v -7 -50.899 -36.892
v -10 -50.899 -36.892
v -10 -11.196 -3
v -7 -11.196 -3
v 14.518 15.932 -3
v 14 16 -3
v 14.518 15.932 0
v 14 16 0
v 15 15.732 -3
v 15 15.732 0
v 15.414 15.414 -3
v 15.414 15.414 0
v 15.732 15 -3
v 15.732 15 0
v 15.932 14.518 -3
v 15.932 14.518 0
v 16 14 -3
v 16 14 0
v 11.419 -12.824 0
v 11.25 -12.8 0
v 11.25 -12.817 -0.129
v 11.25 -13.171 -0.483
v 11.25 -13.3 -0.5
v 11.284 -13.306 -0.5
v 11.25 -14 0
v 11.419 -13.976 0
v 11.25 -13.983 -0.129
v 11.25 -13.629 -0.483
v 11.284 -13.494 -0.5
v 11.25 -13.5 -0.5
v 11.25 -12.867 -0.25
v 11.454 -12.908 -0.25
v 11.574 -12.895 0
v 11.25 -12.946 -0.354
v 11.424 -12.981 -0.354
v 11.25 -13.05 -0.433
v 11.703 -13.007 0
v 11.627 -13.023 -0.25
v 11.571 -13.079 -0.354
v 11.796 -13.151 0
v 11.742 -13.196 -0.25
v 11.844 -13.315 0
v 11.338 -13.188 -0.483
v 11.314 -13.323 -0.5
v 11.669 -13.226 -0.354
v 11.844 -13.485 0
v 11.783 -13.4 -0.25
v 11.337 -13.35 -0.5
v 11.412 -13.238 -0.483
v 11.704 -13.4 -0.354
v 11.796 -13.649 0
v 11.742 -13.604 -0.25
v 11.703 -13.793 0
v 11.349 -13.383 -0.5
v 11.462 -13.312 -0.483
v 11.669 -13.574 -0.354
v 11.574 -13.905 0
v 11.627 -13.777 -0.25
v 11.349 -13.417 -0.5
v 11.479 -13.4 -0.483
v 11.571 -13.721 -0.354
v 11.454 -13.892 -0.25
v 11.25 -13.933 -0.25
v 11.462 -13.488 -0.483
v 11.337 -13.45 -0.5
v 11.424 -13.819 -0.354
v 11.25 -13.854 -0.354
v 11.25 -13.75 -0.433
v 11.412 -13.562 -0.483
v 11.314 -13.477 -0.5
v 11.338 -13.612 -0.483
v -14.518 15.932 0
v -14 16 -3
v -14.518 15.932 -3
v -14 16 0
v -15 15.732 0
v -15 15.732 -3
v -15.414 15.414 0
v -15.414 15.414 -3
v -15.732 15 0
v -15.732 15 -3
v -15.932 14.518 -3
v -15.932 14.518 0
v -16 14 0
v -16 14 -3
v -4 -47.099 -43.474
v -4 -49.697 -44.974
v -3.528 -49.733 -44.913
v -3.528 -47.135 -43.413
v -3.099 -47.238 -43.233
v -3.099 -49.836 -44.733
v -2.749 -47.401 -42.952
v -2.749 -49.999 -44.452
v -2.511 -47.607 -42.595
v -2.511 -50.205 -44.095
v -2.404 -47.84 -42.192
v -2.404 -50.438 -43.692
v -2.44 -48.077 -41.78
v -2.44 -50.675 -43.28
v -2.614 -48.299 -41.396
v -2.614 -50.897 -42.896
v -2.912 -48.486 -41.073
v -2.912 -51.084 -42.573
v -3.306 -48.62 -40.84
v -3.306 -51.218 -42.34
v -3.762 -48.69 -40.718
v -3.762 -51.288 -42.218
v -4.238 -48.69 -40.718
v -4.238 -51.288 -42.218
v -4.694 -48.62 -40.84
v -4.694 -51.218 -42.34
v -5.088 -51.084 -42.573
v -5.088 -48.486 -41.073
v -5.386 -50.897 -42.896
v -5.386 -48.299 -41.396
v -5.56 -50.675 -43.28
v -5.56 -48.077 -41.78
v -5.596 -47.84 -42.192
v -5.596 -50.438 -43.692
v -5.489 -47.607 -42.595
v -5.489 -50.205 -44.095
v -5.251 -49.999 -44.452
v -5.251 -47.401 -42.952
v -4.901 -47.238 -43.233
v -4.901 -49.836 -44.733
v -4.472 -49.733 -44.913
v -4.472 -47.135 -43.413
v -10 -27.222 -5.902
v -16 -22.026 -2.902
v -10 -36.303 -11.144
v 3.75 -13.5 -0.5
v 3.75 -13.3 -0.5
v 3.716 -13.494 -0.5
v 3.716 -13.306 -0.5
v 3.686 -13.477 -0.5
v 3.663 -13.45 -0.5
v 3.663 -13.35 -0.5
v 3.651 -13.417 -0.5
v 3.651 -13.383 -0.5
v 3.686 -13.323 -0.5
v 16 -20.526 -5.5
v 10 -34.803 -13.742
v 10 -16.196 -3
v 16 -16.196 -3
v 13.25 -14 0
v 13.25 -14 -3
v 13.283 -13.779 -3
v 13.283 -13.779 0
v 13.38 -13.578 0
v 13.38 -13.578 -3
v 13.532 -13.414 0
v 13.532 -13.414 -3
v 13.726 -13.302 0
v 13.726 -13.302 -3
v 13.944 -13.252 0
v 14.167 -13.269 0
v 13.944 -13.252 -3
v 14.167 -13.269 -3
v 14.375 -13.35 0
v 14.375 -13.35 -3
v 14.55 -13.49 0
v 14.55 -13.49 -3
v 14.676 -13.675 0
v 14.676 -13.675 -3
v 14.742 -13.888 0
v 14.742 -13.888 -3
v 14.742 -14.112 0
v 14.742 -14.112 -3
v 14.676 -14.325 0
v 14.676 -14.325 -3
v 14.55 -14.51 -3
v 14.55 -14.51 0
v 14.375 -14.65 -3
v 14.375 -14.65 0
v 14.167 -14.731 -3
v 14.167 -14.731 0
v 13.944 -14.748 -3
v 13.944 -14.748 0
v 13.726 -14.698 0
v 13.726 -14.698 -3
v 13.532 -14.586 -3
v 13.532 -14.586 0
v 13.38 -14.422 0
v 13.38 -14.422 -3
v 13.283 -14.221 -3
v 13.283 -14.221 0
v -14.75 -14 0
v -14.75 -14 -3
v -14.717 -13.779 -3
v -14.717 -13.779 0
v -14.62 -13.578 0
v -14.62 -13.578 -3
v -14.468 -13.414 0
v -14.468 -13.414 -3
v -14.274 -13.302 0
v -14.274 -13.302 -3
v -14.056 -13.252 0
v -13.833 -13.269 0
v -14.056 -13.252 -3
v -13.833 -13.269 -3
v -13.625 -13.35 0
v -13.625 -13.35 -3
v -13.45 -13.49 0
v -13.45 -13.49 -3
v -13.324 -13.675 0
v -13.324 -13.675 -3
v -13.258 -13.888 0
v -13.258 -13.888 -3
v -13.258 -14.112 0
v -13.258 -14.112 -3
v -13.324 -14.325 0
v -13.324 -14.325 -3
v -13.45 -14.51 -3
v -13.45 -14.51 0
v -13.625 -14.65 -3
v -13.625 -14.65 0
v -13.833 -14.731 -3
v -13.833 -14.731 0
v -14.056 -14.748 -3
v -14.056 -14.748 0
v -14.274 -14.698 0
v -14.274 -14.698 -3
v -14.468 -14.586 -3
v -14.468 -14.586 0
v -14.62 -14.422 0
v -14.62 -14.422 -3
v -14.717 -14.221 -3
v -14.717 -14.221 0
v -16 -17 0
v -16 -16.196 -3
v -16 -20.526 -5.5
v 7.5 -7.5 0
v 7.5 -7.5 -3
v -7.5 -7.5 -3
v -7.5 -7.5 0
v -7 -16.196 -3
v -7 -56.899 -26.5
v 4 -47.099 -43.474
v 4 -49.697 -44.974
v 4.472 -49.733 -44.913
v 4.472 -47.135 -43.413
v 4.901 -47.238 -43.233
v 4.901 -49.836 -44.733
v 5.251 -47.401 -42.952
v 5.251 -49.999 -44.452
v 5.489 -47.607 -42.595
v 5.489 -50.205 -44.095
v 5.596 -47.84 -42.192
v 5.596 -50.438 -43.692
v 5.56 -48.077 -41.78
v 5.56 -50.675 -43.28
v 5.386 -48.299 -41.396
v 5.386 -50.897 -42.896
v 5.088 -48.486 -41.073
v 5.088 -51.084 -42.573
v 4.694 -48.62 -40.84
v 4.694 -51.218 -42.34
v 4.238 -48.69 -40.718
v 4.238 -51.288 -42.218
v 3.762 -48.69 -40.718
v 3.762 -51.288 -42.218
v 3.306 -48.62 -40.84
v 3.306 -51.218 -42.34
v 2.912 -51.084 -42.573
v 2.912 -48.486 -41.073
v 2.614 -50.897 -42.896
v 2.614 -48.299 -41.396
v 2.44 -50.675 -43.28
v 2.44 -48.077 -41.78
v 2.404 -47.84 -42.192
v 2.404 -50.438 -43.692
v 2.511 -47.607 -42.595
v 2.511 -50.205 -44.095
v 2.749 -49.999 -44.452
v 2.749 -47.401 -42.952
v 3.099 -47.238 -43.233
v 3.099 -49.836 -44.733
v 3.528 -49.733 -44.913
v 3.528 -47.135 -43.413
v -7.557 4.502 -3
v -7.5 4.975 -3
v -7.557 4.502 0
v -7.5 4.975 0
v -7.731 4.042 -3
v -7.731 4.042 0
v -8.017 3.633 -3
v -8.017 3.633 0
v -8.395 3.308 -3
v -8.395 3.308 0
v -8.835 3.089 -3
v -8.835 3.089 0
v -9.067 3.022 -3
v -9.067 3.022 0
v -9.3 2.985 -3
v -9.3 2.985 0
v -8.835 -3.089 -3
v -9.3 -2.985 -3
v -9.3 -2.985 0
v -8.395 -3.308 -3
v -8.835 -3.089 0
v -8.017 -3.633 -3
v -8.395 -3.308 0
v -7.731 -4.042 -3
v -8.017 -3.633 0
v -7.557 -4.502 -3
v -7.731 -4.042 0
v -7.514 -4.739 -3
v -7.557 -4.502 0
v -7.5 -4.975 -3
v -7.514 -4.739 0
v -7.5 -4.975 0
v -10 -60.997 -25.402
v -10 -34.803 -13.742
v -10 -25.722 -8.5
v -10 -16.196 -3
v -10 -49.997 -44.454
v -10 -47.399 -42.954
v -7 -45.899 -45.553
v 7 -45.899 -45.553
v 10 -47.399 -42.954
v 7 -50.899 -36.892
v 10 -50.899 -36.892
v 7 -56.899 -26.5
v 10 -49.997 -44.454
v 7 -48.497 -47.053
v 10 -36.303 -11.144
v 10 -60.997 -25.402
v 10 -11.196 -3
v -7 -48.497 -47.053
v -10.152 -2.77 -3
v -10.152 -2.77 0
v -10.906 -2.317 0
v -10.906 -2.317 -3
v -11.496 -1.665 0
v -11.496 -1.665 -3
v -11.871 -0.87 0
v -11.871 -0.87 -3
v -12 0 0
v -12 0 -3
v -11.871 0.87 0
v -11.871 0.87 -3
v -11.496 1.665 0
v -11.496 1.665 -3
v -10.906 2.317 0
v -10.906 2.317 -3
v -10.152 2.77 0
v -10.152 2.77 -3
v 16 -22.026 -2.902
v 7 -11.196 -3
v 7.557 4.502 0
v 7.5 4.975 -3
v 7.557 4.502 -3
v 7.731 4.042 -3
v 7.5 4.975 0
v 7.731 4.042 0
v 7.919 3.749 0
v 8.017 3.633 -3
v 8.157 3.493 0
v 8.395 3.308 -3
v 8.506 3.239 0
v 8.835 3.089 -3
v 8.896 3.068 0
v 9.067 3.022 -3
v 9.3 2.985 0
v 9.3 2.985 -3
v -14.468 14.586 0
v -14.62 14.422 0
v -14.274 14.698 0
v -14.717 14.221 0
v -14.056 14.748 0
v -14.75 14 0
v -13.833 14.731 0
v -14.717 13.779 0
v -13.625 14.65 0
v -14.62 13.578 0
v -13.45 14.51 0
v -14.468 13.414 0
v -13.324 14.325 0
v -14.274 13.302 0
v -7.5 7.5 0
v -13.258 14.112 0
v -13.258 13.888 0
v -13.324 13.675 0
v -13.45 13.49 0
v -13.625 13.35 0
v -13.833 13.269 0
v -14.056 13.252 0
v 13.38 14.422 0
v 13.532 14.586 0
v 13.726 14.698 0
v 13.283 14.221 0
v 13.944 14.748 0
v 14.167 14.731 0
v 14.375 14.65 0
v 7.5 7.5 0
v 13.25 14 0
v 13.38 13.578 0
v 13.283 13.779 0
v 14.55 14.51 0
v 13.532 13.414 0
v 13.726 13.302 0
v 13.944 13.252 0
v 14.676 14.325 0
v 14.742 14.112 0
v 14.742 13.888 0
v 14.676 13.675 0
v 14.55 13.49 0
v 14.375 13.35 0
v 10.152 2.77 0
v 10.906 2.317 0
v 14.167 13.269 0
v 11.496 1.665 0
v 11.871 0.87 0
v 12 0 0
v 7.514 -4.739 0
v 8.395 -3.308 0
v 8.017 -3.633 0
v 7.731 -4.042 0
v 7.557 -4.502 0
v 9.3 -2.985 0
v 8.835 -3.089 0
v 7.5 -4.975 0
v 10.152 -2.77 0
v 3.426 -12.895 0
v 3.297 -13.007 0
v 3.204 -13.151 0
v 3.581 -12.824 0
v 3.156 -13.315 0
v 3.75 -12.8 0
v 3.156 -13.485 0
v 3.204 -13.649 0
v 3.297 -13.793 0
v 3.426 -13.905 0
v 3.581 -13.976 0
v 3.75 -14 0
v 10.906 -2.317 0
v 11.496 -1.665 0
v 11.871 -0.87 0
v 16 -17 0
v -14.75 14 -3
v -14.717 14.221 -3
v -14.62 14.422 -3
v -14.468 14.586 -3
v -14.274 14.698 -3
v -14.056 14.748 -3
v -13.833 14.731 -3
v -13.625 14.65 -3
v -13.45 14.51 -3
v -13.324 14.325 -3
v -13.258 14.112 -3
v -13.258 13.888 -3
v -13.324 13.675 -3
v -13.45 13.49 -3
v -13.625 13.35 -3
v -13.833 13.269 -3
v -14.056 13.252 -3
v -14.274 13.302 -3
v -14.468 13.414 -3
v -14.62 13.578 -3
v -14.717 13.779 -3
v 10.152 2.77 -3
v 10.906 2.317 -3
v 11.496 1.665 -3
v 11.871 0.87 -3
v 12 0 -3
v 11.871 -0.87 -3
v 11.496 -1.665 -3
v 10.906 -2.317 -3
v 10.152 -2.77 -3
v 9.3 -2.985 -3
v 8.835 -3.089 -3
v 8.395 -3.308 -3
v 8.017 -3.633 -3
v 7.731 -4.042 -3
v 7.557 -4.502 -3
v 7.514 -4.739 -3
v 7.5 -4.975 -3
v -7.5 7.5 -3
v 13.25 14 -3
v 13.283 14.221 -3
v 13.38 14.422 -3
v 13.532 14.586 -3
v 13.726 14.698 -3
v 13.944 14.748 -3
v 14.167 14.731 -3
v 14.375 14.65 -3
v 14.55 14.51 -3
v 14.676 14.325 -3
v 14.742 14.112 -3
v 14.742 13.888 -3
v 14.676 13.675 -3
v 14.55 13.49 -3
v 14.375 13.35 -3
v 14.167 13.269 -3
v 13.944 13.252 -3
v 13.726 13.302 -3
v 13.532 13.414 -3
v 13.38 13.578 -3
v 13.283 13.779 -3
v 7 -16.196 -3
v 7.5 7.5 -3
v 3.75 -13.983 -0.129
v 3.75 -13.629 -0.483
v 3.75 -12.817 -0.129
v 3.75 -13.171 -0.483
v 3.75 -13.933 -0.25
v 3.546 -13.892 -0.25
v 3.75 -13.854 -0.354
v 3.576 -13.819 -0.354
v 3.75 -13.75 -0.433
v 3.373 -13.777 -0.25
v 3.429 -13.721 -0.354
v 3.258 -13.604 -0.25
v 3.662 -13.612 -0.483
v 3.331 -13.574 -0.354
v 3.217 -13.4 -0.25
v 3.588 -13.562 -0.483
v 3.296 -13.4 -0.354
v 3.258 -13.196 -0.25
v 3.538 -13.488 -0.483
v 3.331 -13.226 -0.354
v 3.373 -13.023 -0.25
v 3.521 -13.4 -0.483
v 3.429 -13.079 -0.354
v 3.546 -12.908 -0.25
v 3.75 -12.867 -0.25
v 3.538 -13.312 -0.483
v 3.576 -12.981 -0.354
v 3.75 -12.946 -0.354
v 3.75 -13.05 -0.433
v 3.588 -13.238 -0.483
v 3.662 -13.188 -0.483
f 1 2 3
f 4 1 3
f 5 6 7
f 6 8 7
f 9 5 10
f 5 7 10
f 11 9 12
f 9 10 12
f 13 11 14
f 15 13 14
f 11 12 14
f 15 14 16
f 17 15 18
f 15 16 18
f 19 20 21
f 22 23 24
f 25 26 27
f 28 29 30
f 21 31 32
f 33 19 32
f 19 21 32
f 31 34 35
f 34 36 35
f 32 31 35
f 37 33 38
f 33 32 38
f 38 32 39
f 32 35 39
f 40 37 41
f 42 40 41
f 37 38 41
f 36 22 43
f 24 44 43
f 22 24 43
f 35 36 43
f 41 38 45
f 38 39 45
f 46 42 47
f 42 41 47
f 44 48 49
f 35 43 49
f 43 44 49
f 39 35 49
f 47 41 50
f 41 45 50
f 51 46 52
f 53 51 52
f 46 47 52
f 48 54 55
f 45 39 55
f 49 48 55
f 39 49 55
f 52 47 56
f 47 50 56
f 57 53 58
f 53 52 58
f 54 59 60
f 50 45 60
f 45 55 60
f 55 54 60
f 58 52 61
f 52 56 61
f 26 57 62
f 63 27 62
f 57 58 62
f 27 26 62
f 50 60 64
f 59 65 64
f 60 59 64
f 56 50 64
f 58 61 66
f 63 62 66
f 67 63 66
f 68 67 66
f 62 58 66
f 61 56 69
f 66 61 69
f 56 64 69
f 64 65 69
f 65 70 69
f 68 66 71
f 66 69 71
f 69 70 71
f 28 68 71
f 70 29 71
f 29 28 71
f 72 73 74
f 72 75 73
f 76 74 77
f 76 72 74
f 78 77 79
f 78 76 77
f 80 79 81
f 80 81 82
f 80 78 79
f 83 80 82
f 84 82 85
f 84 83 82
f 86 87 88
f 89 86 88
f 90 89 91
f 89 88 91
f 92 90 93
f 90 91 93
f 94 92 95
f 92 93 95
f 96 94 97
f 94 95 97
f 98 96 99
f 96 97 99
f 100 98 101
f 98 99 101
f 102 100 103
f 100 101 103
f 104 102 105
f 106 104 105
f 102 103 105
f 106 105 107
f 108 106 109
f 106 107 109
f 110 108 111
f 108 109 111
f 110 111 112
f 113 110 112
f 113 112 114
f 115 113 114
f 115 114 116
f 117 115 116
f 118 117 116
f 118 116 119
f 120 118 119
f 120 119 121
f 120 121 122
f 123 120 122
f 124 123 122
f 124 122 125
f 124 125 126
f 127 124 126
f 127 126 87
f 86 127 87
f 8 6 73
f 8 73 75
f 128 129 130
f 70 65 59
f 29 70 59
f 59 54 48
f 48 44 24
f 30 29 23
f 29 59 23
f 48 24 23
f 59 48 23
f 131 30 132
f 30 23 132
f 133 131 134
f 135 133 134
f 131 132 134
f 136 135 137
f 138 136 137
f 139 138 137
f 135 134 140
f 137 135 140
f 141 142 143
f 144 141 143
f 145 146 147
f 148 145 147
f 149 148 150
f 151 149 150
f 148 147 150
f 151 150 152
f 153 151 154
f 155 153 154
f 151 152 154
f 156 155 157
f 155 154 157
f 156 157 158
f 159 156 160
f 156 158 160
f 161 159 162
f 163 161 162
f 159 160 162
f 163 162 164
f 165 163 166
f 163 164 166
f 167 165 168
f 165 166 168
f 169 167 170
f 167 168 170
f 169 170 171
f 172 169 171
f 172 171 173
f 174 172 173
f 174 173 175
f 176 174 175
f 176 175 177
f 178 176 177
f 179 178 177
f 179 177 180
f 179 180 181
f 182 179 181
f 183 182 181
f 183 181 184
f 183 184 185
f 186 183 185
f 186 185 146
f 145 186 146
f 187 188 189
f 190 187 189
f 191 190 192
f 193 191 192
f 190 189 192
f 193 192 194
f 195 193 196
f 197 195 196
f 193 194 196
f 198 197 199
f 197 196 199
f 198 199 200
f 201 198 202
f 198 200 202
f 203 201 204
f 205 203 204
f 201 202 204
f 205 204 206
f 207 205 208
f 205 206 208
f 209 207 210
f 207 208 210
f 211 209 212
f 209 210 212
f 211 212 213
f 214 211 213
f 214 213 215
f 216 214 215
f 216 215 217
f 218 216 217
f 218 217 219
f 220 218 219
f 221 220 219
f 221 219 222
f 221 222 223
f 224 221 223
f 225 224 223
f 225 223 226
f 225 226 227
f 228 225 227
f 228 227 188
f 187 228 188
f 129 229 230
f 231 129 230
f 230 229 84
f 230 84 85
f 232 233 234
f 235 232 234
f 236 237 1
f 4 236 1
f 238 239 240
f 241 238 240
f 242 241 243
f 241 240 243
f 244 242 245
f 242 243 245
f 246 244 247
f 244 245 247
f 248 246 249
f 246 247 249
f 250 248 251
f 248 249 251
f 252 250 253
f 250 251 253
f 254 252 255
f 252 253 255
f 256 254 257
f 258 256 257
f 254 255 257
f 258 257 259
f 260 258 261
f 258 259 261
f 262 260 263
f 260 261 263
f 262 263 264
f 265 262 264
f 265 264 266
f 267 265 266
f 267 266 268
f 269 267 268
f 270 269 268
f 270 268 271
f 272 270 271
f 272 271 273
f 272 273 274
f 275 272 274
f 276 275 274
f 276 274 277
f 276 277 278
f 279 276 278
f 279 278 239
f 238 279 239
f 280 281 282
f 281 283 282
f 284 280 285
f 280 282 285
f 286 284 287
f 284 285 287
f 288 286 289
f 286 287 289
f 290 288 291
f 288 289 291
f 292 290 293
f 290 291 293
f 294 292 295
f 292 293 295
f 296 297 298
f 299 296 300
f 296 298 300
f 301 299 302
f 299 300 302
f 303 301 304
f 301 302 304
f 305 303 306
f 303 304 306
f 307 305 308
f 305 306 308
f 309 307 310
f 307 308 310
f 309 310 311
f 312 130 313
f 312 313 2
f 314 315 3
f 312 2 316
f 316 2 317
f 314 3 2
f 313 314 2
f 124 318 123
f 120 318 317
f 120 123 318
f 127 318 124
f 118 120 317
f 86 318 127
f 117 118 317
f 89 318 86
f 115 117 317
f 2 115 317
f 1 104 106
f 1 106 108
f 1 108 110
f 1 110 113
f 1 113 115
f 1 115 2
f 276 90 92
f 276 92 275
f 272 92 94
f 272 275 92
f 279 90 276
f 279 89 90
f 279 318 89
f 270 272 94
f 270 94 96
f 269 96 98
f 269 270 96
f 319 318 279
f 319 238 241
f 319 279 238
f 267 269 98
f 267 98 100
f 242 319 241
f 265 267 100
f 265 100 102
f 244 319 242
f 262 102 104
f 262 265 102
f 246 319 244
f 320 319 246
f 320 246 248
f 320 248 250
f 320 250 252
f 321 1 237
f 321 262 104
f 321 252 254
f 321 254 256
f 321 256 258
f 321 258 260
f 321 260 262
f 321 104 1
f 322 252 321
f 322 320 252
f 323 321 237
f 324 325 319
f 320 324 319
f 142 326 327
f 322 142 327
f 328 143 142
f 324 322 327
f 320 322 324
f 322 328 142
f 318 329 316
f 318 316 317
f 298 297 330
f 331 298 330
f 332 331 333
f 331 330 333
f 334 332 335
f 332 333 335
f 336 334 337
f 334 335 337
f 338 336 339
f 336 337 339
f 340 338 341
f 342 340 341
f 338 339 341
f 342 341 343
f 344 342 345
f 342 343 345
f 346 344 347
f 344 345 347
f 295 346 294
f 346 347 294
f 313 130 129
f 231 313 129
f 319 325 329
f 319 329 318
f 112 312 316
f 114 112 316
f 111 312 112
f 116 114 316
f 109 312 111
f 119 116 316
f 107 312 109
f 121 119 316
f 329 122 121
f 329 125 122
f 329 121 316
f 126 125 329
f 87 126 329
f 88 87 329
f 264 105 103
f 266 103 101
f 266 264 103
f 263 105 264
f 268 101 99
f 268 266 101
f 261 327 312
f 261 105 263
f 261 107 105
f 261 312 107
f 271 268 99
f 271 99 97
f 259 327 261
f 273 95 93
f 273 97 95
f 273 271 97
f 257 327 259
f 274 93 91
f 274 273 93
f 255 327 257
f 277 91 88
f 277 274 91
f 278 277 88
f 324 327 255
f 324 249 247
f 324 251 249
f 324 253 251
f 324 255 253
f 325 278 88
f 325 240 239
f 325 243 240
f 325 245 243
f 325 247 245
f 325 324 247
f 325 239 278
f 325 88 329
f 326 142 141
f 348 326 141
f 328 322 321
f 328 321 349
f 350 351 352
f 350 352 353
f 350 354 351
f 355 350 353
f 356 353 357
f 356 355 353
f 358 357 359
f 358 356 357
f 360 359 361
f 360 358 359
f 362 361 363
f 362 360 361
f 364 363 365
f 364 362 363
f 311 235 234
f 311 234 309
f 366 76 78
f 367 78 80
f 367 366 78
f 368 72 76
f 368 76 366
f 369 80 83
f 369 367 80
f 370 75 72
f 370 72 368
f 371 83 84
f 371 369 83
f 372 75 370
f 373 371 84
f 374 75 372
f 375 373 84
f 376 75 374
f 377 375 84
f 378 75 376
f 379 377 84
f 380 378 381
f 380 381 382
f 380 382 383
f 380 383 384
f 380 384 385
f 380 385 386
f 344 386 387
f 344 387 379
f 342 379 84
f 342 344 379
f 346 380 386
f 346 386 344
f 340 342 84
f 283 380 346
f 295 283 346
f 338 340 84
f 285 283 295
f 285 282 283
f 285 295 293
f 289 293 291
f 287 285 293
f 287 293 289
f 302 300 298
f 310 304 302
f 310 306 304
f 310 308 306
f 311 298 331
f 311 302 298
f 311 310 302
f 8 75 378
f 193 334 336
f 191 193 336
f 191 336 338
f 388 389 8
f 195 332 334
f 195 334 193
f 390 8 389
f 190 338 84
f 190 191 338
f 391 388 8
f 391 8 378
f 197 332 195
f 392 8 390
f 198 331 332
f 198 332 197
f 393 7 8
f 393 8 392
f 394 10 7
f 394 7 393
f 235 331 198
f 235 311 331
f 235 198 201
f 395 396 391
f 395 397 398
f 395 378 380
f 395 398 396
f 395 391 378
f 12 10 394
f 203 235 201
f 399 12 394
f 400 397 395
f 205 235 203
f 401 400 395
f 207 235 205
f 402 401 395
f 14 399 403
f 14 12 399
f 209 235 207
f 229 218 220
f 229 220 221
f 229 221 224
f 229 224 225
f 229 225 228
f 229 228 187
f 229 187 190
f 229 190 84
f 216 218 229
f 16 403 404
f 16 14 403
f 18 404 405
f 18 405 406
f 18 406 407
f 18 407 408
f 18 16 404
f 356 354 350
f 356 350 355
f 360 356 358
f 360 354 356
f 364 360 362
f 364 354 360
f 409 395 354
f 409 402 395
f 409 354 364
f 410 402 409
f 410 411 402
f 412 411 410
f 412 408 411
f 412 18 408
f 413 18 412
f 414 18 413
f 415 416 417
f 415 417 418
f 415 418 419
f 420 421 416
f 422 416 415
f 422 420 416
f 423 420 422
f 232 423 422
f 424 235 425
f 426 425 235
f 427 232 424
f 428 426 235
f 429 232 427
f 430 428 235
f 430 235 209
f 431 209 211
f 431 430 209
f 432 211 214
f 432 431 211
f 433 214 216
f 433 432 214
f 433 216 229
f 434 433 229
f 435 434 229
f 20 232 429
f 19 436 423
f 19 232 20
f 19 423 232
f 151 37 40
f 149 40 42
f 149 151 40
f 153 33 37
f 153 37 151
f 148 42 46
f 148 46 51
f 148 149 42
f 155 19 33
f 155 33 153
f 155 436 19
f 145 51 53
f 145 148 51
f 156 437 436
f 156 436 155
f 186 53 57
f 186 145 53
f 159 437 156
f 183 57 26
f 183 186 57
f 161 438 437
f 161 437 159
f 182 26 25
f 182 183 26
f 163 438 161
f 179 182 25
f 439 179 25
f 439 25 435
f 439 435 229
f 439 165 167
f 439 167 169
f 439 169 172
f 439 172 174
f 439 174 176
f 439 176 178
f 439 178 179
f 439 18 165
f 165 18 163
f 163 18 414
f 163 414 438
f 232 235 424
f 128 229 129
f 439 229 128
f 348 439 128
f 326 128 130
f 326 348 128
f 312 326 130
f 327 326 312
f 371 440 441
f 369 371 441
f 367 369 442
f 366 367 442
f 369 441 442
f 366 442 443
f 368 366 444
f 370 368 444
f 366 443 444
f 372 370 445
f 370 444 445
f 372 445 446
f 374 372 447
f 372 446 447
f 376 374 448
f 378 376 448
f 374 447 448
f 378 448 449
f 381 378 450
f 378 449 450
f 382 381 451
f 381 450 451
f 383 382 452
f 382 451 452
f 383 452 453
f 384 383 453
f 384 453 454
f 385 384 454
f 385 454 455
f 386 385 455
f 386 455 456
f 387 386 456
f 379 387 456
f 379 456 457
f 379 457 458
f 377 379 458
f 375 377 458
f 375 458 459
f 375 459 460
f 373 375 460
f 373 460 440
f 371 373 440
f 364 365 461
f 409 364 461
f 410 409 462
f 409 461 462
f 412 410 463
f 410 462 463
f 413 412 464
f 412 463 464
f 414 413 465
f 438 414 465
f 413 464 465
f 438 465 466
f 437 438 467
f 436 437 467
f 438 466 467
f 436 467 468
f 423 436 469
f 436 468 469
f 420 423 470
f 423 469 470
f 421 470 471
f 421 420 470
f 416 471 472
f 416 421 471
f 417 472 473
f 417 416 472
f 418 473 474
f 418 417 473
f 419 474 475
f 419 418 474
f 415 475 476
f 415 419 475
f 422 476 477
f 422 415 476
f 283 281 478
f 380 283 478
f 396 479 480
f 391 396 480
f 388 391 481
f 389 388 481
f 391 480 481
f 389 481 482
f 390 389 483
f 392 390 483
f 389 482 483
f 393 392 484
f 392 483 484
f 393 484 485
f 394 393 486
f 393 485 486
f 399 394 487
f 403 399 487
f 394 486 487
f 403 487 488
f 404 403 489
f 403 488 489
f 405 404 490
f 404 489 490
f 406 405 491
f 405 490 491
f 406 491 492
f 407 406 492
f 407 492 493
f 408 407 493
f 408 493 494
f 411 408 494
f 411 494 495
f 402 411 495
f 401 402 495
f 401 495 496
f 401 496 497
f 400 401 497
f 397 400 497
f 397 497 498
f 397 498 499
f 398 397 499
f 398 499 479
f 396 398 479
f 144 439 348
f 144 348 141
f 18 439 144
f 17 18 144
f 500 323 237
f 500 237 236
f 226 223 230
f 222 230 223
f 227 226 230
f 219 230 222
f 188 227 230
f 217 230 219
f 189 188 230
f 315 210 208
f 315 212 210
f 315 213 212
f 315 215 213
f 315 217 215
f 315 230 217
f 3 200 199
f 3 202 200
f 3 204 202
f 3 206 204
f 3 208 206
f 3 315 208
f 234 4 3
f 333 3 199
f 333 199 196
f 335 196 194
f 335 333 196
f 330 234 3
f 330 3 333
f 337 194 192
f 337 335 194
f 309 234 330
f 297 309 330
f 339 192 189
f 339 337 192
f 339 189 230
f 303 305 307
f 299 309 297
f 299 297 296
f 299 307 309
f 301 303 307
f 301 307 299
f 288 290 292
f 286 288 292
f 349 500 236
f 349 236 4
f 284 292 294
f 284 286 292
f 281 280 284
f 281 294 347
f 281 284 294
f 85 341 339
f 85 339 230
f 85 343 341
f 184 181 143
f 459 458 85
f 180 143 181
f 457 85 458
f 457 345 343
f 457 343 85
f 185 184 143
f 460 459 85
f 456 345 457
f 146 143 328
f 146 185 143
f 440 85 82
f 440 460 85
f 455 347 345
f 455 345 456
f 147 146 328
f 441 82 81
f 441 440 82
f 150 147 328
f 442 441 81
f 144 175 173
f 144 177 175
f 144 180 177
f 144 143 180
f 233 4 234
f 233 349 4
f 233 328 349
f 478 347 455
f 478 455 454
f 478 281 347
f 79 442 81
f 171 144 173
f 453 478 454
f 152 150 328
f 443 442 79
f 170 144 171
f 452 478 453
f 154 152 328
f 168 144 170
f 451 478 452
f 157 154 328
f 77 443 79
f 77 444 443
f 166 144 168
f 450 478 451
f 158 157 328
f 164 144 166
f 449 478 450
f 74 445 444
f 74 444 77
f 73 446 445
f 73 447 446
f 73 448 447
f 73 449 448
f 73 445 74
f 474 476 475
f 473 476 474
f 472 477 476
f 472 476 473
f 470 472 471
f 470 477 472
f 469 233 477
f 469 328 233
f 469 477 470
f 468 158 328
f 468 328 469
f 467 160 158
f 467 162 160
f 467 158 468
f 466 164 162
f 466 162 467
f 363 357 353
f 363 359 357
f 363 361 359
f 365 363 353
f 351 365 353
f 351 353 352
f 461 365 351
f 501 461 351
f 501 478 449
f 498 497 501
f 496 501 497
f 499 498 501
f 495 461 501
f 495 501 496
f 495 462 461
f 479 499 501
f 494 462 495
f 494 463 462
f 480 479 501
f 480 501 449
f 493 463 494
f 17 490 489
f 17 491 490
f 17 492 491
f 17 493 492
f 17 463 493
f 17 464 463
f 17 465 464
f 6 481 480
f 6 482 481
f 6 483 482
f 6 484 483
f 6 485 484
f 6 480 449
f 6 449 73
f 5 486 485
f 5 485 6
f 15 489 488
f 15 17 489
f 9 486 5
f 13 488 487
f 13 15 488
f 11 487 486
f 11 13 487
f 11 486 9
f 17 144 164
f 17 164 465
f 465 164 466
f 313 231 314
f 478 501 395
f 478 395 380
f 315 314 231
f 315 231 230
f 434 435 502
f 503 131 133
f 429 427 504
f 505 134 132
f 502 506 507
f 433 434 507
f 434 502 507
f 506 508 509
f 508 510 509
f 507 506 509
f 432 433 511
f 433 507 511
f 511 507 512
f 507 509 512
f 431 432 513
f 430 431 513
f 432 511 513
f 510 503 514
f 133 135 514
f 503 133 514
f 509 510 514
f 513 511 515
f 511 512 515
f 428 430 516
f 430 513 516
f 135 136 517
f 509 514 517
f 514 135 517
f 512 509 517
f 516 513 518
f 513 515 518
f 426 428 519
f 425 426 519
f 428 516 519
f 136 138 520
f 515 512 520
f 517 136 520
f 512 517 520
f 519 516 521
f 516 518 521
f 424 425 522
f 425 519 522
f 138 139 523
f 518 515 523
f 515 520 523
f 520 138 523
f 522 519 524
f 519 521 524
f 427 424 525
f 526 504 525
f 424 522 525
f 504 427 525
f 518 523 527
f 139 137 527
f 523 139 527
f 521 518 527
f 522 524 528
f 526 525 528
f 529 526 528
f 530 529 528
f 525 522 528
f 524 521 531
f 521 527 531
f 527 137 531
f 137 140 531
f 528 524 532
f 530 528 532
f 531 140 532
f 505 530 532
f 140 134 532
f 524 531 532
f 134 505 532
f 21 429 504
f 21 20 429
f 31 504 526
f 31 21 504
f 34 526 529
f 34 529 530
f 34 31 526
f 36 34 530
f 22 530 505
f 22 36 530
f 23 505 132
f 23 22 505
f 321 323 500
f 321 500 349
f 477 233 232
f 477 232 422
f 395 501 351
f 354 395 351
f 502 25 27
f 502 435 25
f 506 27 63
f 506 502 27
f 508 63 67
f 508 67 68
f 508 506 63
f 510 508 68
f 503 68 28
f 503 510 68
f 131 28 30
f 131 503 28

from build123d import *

# Parameters (mm, degrees)
BOSS_EXTRUDE1_DEPTH = 16
FILLET1_R           = 2
SKETCH2_W           = 15
SKETCH2_H           = 4.5
SKETCH2_H_2         = 6
SKETCH2_R           = 0.75
CUT_EXTRUDE1_DEPTH  = 32
SKETCH4_R           = 1.6
CUT_EXTRUDE2_DEPTH  = 92
CUT_EXTRUDE4_DEPTH  = 80.584099309
BOSS_EXTRUDE2_DEPTH = 3
DRAFT1_ANGLE        = 70
DRAFT2_START        = -8.5
DRAFT2_DEPTH        = 3
CUT_EXTRUDE5_DEPTH  = 0.5
FILLET4_R           = 0.5
FILLET3_R           = 2
CHAMFER1_SIZE       = 3


# Read off the part's stored shape, not the designer's step: Draft2
with BuildPart() as part:
    # Sketch1 → Boss-Extrude1 (new, symmetric)
    with BuildSketch(Plane(origin=(0, 0, 0), x_dir=(0, 0, -1), z_dir=(1, 0, 0))):
        Polygon((0, 16), (0, -17), (25.401923789, -60.997422612), (47.052558883, -48.497422612), (45.552558883, -45.899346401), (26.5, -56.899346401), (3, -16.196152423), (3, 16), align=None)
    extrude(amount=BOSS_EXTRUDE1_DEPTH, both=True)

    # Fillet1
    fillet1_edges = [part.edges().sort_by_distance(p)[0] for p in [
        (-16, 16, -1.5),
        (16, 16, -1.5),
    ]]
    fillet(fillet1_edges, radius=FILLET1_R)

    # Sketch2 → Cut-Extrude1 (cut)
    with BuildSketch(Plane(origin=(0, 0, -3), x_dir=(-1, 0, 0), z_dir=(0, 0, -1))):
        with Locations((0, 5.25)):
            Rectangle(SKETCH2_W, SKETCH2_H)
        Rectangle(SKETCH2_W, SKETCH2_H_2)
        with BuildLine():
            Line((-9, -3), (-7.5, -3))
            Line((-7.5, -3), (-7.5, 3))
            Line((-7.5, 3), (-9, 3))
            ThreePointArc((-9, 3), (-12, 0), (-9, -3))
        make_face()
        with Locations((0, -5.25)):
            Rectangle(SKETCH2_W, SKETCH2_H)
        with BuildLine():
            Line((7.5, 3), (7.5, -3))
            Line((7.5, -3), (9, -3))
            ThreePointArc((9, -3), (12, 0), (9, 3))
            Line((9, 3), (7.5, 3))
        make_face()
        with Locations((14, -14)):
            Circle(SKETCH2_R)
        with Locations((-14, -14)):
            Circle(SKETCH2_R)
        with Locations((-14, 14)):
            Circle(SKETCH2_R)
        with Locations((14, 14)):
            Circle(SKETCH2_R)
    extrude(amount=-CUT_EXTRUDE1_DEPTH, mode=Mode.SUBTRACT)

    # Sketch4 → Cut-Extrude2 (cut)
    with BuildSketch(Plane(origin=(0, -56.747422612, -32.763139721), x_dir=(1, 0, 0), z_dir=(0, -0.8660254037844379, -0.5000000000000014))):
        with Locations(Location((-4, -12.5, 0), (0, 0, 270))):
            Circle(SKETCH4_R)
        with Locations(Location((4, -12.5, 0), (0, 0, 270))):
            Circle(SKETCH4_R)
    extrude(amount=-CUT_EXTRUDE2_DEPTH, mode=Mode.SUBTRACT)

    # Sketch7 → Cut-Extrude4 (cut, symmetric)
    with BuildSketch(Plane(origin=(0, -2.75, 4.763139721), x_dir=(-1, 0, 0), z_dir=(0, 0.500000000000002, -0.8660254037844375))):
        Polygon((-10, -65.526279442), (-10, -26.526279442), (-16, -20.526279442), (-16, -65.526279442), align=None)
    cut_extrude4 = extrude(amount=CUT_EXTRUDE4_DEPTH, both=True, mode=Mode.SUBTRACT)

    # Sketch5 → Boss-Extrude2 (add)
    with BuildSketch(Plane(origin=(10, 0, 0), x_dir=(0, 0, -1), z_dir=(1, 0, 0))):
        Polygon((36.892304845, -50.899346401), (3, -11.196152423), (3, -16.196152423), (26.5, -56.899346401), align=None)
    boss_extrude2 = extrude(amount=-BOSS_EXTRUDE2_DEPTH)

    # Draft1
    draft1_faces = [part.faces().sort_by_distance(p)[0] for p in [
        (13, -23.874355653, -5.700961894),
    ]]
    draft(draft1_faces, Plane(origin=(16, 0, 0), x_dir=(0, 0, 1), z_dir=(1, 0, 0)), DRAFT1_ANGLE)

    # Mirror2: Cut-Extrude4, Boss-Extrude2 across plane
    add(cut_extrude4.mirror(Plane(origin=(0, 0, 0), x_dir=(0, 0, 1), z_dir=(1, 0, 0))), mode=Mode.SUBTRACT)
    add(boss_extrude2.mirror(Plane(origin=(0, 0, 0), x_dir=(0, 0, 1), z_dir=(1, 0, 0))))

    # Draft2 outline → Draft2 (add)
    with BuildSketch(Plane(origin=(0, 0, 0), x_dir=(1, 0, 0), z_dir=(0, 0.5000000000000018, -0.8660254037844377)).offset(DRAFT2_START)):
        Polygon((-10, 26.526279442), (-10, 37.011143958), (-16, 20.526279442), align=None)
    extrude(amount=DRAFT2_DEPTH)

    # Sketch8 → Cut-Extrude5 (cut)
    with BuildSketch(Plane.XY):
        with BuildLine():
            Line((3.75, -12.8), (11.25, -12.8))
            ThreePointArc((11.25, -12.8), (11.85, -13.4), (11.25, -14))
            Line((11.25, -14), (3.75, -14))
            ThreePointArc((3.75, -14), (3.15, -13.4), (3.75, -12.8))
        make_face()
    extrude(amount=-CUT_EXTRUDE5_DEPTH, mode=Mode.SUBTRACT)

    # Fillet4
    fillet4_edges = [part.edges().sort_by_distance(p)[0] for p in [
        (7.5, -12.8, -0.5),
        (11.85, -13.4, -0.5),
        (7.5, -14, -0.5),
        (3.15, -13.4, -0.5),
    ]]
    fillet(fillet4_edges, radius=FILLET4_R - 0.0001)  # a hair under: the kernel refuses the full size

    # Fillet3
    fillet3_edges = [part.edges().sort_by_distance(p)[0] for p in [
        (-7.5, 3, -1.5),
        (-7.5, -3, -1.5),
        (7.5, -3, -1.5),
        (7.5, 3, -1.5),
    ]]
    fillet(fillet3_edges, radius=FILLET3_R)

    # Chamfer1
    chamfer1_edges = [part.edges().sort_by_distance(p)[0] for p in [
        (10, -47.198384506, -46.302558883),
        (-10, -47.198384506, -46.302558883),
    ]]
    chamfer(chamfer1_edges, length=CHAMFER1_SIZE)


solid = part.part
